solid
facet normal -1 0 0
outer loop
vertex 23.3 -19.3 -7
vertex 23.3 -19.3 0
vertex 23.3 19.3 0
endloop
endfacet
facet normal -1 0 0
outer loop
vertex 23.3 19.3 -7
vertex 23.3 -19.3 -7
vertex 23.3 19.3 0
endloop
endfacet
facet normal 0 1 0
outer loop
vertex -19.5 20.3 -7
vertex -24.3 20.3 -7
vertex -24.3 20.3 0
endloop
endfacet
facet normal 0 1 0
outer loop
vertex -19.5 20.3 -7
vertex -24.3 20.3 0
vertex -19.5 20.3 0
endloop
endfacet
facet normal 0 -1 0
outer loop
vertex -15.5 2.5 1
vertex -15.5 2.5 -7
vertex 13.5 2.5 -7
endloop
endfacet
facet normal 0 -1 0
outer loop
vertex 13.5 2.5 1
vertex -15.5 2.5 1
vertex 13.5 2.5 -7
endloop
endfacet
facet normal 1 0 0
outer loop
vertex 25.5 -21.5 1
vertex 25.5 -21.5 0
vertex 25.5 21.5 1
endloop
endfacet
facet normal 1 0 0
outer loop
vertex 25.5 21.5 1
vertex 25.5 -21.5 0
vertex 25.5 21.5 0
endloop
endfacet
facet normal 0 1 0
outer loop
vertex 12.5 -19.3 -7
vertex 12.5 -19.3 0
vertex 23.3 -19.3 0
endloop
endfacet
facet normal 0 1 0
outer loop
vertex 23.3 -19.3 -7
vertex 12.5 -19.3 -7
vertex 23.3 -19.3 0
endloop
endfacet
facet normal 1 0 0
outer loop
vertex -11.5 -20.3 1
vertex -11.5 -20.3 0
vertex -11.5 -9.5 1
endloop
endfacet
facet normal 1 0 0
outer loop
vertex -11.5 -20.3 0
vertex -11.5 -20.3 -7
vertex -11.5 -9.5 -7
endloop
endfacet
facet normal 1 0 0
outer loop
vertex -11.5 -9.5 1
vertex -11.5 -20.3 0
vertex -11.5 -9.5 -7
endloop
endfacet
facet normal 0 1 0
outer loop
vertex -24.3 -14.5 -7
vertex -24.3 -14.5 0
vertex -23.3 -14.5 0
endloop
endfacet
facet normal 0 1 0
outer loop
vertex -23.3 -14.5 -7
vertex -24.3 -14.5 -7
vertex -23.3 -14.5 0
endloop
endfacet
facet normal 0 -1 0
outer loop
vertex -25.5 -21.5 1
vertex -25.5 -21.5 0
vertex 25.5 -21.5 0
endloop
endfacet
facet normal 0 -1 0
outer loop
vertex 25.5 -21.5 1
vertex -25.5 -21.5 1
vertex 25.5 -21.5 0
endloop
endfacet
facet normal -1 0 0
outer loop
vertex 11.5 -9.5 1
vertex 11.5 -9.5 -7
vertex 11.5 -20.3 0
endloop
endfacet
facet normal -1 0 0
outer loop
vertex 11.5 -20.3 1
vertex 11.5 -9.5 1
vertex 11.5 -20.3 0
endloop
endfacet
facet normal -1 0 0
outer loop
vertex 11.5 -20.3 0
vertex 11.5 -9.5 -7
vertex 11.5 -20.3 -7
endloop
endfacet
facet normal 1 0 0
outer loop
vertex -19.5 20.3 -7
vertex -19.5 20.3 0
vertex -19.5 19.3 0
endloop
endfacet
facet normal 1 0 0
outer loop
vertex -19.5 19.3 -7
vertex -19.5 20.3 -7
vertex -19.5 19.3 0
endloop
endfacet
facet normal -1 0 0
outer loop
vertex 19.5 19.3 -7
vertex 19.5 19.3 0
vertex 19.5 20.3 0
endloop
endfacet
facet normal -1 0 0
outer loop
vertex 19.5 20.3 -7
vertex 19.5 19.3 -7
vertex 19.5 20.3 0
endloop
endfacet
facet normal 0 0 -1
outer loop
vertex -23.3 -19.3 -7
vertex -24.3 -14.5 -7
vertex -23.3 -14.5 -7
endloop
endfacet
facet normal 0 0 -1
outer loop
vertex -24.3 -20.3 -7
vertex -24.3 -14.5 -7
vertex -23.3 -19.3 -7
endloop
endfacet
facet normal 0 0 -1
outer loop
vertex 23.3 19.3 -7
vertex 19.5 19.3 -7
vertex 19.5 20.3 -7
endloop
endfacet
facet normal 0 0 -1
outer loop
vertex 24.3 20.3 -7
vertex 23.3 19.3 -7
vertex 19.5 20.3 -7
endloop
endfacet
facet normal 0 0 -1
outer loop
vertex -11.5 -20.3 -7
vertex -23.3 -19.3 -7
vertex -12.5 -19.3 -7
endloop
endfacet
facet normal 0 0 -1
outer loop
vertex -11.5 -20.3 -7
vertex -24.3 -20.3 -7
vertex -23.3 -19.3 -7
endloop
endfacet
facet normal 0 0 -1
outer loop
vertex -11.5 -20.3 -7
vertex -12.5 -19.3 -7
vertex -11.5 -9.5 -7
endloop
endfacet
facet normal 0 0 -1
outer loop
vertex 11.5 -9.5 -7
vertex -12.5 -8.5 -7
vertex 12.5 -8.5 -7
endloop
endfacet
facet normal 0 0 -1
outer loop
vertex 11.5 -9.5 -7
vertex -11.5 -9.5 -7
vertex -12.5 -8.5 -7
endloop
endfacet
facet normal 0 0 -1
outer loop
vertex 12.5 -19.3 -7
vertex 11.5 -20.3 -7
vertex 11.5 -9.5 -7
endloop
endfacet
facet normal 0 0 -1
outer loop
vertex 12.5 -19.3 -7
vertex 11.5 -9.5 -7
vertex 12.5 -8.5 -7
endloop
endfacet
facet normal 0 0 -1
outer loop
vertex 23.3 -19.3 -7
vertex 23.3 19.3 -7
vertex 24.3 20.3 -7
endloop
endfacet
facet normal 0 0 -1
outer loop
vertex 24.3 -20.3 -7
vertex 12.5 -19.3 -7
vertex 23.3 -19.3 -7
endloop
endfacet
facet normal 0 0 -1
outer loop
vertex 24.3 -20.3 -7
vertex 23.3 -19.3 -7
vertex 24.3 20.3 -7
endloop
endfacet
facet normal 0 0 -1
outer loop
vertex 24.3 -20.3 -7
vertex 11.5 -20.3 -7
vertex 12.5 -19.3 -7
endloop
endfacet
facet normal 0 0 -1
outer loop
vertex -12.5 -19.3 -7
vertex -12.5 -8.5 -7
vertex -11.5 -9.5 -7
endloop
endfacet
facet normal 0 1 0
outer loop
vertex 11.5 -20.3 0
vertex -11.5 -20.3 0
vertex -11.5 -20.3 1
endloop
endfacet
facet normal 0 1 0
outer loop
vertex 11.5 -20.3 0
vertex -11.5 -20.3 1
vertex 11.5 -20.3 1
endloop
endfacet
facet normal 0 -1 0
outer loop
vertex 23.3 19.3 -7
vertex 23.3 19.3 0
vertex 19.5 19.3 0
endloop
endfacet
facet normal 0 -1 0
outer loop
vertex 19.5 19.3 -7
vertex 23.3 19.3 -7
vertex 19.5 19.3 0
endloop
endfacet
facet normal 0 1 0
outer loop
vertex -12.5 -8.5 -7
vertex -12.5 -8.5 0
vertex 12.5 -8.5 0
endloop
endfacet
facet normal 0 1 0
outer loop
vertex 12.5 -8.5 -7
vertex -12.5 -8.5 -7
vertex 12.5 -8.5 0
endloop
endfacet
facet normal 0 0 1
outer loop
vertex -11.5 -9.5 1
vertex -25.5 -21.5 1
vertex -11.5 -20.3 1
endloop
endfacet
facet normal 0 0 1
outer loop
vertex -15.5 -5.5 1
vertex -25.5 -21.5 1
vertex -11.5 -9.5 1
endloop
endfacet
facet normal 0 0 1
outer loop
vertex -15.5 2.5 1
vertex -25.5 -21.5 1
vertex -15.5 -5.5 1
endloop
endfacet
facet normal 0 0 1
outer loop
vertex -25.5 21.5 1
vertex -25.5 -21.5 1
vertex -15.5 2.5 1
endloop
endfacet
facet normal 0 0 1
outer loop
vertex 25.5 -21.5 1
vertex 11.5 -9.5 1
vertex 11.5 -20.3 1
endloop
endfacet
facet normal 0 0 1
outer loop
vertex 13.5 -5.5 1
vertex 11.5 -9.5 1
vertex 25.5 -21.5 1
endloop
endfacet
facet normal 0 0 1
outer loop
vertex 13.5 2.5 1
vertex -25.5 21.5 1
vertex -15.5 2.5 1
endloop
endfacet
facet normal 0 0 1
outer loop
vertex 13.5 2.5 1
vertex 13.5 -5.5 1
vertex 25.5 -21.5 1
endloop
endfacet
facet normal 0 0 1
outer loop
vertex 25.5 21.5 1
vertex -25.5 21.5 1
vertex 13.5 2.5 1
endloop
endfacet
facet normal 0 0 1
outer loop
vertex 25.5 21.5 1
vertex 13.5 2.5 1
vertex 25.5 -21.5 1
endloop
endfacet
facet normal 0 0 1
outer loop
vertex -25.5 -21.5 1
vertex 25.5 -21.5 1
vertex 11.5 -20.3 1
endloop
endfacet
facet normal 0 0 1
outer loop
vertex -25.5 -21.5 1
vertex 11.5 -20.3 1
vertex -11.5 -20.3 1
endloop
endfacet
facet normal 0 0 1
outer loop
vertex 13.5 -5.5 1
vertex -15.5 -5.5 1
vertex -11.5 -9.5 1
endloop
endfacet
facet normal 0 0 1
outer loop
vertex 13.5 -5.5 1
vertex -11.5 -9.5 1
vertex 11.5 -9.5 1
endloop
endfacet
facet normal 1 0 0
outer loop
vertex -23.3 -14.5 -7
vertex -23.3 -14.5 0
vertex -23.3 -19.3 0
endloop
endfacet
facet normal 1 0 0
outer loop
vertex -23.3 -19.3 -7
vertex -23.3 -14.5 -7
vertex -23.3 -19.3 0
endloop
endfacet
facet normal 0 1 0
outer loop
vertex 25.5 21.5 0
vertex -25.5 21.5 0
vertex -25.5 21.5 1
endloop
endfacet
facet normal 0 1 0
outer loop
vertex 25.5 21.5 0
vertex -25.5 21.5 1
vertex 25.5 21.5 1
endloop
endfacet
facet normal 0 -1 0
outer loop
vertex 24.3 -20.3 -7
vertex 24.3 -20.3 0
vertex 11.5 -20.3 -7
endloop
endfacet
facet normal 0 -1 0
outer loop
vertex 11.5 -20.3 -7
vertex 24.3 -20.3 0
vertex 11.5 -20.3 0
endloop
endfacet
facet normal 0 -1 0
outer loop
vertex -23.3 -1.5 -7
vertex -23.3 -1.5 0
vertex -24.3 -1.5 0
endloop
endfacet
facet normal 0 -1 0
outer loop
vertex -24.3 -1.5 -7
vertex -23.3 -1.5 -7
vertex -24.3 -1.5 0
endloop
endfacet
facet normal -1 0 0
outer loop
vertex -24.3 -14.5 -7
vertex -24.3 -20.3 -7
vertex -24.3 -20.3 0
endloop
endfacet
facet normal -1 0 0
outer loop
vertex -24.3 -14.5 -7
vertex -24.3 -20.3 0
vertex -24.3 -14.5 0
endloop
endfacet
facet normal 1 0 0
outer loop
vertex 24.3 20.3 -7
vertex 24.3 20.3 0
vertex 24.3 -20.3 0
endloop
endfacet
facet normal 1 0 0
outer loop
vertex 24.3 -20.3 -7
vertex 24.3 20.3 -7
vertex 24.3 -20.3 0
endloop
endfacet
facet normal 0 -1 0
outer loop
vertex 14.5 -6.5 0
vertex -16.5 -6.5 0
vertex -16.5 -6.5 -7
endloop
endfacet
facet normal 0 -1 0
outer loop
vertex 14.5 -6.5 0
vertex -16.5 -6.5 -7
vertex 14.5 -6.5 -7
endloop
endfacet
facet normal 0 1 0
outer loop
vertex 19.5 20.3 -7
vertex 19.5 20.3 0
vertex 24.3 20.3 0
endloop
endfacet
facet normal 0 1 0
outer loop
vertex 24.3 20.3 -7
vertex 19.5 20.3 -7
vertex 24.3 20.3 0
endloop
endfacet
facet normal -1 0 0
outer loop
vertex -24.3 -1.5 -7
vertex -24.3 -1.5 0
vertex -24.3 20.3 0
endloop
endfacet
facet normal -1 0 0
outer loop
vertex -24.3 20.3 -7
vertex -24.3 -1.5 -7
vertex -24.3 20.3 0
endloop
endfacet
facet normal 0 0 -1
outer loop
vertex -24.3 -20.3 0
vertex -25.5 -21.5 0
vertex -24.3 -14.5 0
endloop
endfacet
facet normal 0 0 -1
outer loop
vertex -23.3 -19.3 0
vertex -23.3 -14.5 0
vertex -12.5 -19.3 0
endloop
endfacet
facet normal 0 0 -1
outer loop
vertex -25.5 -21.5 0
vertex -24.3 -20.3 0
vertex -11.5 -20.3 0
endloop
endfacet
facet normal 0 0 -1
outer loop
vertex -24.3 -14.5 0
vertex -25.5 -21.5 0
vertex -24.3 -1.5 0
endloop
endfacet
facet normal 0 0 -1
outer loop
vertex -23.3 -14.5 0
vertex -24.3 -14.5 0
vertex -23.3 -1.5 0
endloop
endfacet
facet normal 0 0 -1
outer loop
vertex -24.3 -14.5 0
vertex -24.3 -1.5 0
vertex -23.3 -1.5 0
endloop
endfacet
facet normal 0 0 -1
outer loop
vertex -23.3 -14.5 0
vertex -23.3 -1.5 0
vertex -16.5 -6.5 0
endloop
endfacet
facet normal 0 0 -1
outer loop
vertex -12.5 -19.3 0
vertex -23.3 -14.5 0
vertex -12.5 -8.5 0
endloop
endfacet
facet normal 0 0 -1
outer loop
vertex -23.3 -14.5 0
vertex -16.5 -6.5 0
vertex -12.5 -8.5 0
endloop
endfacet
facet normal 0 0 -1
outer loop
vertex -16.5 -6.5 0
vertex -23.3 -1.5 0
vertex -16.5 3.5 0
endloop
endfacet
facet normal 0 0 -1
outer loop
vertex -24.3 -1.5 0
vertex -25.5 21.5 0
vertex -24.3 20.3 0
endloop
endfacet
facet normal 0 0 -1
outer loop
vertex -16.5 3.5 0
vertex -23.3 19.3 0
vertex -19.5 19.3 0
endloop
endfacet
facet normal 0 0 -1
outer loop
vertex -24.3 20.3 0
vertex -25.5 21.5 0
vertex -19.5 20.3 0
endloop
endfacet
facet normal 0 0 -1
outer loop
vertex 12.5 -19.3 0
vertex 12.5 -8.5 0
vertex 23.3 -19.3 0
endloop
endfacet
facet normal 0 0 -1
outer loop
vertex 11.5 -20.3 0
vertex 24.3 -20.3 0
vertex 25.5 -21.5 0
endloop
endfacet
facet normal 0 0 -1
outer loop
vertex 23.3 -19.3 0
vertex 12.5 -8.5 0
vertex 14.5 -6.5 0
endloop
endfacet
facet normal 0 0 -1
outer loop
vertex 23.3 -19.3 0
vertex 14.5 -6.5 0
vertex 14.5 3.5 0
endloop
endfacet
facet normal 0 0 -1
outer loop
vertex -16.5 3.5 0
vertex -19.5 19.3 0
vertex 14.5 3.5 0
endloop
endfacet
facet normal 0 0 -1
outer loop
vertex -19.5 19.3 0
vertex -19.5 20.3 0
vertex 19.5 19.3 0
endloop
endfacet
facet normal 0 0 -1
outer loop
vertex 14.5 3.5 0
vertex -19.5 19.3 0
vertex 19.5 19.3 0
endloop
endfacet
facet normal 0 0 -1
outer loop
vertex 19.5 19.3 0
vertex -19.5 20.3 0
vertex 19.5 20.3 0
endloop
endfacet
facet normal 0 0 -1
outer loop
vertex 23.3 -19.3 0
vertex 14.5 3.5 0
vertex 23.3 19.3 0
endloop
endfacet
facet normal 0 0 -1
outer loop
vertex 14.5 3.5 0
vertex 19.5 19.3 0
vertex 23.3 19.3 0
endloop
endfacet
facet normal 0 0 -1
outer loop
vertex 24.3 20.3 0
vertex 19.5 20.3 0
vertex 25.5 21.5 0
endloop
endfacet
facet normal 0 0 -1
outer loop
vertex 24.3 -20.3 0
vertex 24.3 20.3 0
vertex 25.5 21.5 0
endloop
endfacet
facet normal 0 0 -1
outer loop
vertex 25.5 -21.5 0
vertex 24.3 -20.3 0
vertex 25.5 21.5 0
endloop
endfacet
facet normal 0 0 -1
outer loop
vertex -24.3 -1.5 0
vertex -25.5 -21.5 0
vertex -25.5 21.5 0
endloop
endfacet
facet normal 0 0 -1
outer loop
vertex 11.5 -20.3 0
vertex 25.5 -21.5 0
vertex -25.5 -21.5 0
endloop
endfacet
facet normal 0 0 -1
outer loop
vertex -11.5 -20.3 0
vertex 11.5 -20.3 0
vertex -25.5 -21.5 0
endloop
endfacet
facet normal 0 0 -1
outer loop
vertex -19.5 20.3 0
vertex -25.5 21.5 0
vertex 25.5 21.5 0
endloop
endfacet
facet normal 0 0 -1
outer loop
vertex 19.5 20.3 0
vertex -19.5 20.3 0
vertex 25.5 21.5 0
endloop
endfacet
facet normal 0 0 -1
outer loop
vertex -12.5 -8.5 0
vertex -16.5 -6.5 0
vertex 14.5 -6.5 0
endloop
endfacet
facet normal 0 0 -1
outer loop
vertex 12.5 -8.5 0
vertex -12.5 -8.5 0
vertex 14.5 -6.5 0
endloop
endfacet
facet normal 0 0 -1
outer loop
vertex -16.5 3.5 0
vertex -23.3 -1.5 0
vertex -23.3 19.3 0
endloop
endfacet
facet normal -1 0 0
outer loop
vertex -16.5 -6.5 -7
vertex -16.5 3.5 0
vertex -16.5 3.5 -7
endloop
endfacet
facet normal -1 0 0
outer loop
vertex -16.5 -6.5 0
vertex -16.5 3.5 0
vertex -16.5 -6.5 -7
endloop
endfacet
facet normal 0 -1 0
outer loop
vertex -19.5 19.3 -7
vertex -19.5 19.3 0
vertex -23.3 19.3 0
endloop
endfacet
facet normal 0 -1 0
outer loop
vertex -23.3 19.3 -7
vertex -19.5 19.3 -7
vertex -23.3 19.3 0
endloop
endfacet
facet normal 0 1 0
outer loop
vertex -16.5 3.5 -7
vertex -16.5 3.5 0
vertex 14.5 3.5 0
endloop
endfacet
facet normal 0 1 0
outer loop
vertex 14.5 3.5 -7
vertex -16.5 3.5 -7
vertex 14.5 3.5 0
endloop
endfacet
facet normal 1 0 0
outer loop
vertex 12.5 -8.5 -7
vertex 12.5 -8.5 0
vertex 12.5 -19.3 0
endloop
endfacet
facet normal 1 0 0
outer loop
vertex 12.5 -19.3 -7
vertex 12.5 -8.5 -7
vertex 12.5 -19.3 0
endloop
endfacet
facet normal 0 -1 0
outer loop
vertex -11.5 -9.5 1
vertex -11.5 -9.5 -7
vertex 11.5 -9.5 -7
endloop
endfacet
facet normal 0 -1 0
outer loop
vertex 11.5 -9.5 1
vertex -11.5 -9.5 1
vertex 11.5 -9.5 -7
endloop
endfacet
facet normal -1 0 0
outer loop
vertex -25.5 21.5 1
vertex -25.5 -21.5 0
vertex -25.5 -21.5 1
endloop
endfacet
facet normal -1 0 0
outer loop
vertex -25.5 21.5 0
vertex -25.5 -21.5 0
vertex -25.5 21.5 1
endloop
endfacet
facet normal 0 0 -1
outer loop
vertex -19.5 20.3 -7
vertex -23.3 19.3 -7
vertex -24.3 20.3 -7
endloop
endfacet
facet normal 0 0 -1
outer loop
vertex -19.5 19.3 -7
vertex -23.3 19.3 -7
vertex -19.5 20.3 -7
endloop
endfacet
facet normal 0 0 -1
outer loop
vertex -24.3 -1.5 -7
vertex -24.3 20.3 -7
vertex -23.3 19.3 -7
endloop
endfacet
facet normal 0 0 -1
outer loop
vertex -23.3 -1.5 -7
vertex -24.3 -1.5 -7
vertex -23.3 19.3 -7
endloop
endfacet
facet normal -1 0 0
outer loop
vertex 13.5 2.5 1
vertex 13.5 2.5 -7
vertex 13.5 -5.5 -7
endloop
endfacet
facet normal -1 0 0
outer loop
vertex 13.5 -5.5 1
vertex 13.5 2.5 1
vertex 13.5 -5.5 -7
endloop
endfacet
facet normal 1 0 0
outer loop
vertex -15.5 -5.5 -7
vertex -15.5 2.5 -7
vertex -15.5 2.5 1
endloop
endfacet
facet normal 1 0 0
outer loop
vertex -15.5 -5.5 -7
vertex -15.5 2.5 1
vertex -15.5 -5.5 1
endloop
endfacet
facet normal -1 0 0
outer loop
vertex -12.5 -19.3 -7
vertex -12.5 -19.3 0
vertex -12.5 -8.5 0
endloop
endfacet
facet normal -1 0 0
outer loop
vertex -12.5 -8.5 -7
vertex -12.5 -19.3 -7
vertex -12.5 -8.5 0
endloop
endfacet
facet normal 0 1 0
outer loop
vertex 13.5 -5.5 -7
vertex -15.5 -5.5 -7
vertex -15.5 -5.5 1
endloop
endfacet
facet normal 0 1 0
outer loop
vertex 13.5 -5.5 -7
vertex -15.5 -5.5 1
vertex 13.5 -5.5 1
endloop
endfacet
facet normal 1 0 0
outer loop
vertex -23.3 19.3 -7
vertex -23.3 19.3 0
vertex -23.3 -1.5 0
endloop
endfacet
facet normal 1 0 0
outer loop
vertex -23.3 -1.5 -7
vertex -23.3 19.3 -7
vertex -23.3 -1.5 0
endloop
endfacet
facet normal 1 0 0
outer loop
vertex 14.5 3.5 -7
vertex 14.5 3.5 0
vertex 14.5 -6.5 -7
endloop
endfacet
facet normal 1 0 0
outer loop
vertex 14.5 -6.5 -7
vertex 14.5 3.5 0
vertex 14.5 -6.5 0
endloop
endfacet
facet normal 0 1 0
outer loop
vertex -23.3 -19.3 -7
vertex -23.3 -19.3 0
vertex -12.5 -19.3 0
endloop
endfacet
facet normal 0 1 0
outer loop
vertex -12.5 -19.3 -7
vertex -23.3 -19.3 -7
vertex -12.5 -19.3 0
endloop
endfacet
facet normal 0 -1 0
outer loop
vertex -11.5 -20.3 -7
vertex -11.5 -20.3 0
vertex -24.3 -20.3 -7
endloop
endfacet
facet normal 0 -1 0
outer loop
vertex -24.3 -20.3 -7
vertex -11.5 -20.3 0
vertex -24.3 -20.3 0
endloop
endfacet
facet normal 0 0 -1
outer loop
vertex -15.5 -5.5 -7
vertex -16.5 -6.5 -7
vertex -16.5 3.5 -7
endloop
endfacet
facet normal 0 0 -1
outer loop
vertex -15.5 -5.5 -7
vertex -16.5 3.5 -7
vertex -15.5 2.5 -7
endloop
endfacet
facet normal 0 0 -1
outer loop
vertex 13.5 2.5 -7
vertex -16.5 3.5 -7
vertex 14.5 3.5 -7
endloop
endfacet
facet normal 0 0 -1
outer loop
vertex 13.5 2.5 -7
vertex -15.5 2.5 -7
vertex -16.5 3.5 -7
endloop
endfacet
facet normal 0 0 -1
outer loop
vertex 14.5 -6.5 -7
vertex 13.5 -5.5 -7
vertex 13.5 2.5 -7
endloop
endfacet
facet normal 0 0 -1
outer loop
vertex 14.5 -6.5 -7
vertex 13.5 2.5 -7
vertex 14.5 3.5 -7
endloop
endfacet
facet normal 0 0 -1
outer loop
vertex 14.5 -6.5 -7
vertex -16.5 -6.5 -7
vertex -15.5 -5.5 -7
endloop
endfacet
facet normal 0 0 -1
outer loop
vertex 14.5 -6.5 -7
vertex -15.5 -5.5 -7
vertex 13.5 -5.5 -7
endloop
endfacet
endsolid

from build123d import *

# Parameters (mm, degrees)
F0_W     = 51
F0_H     = 43
F1_DEPTH = 1
F2_W     = 31
F2_H     = 10
F2_W_2   = 29
F2_H_2   = 8
F3_DEPTH = 7
F4_DEPTH = 25
F2_W_3   = 23
F2_H_3   = 1
F2_H_4   = 9.8
F5_DEPTH = 25


with BuildPart() as f1:
    # F0 (on Top) → F1 (new body)
    with BuildSketch(Plane.XY):
        Rectangle(F0_W, F0_H)
    extrude(amount=F1_DEPTH)

    # F2 (on face) → F3 (join)
    with BuildSketch(Plane(origin=(0, 0, 0), x_dir=(1, 0, 0), z_dir=(0, 0, -1))):
        Polygon((-11.5, 19.3), (-11.5, 20.3), (-24.3, 20.3), (-24.3, 14.5), (-23.3, 14.5), (-23.3, 19.3), (-12.5, 19.3), align=None)
        Polygon((19.5, -20.3), (24.3, -20.3), (24.3, 20.3), (11.5, 20.3), (11.5, 19.3), (12.5, 19.3), (23.3, 19.3), (23.3, -19.3), (19.5, -19.3), align=None)
        Polygon((-24.3, -20.3), (-19.5, -20.3), (-19.5, -19.3), (-23.3, -19.3), (-23.3, 1.5), (-24.3, 1.5), align=None)
        with Locations((-1, 1.5)):
            Rectangle(F2_W, F2_H)
        with Locations((-1, 1.5)):
            Rectangle(F2_W_2, F2_H_2, mode=Mode.SUBTRACT)
        Polygon((12.5, 19.3), (11.5, 19.3), (11.5, 9.5), (-11.5, 9.5), (-11.5, 19.3), (-12.5, 19.3), (-12.5, 8.5), (12.5, 8.5), align=None)
    extrude(amount=F3_DEPTH)

    # F4 (cut): a face of the model
    f4_faces = [f1.faces().sort_by_distance(p)[0] for p in [
        (-1, -1.5, 0),
    ]]
    extrude(f4_faces, amount=-F4_DEPTH, mode=Mode.SUBTRACT)

    # F2 (on face) → F5 (cut)
    with BuildSketch(Plane(origin=(0, 0, 0), x_dir=(1, 0, 0), z_dir=(0, 0, -1))):
        with Locations((0, 19.8)):
            Rectangle(F2_W_3, F2_H_3)
        with Locations((0, 14.4)):
            Rectangle(F2_W_3, F2_H_4)
    extrude(amount=-F5_DEPTH, mode=Mode.SUBTRACT)


solid = f1.part
